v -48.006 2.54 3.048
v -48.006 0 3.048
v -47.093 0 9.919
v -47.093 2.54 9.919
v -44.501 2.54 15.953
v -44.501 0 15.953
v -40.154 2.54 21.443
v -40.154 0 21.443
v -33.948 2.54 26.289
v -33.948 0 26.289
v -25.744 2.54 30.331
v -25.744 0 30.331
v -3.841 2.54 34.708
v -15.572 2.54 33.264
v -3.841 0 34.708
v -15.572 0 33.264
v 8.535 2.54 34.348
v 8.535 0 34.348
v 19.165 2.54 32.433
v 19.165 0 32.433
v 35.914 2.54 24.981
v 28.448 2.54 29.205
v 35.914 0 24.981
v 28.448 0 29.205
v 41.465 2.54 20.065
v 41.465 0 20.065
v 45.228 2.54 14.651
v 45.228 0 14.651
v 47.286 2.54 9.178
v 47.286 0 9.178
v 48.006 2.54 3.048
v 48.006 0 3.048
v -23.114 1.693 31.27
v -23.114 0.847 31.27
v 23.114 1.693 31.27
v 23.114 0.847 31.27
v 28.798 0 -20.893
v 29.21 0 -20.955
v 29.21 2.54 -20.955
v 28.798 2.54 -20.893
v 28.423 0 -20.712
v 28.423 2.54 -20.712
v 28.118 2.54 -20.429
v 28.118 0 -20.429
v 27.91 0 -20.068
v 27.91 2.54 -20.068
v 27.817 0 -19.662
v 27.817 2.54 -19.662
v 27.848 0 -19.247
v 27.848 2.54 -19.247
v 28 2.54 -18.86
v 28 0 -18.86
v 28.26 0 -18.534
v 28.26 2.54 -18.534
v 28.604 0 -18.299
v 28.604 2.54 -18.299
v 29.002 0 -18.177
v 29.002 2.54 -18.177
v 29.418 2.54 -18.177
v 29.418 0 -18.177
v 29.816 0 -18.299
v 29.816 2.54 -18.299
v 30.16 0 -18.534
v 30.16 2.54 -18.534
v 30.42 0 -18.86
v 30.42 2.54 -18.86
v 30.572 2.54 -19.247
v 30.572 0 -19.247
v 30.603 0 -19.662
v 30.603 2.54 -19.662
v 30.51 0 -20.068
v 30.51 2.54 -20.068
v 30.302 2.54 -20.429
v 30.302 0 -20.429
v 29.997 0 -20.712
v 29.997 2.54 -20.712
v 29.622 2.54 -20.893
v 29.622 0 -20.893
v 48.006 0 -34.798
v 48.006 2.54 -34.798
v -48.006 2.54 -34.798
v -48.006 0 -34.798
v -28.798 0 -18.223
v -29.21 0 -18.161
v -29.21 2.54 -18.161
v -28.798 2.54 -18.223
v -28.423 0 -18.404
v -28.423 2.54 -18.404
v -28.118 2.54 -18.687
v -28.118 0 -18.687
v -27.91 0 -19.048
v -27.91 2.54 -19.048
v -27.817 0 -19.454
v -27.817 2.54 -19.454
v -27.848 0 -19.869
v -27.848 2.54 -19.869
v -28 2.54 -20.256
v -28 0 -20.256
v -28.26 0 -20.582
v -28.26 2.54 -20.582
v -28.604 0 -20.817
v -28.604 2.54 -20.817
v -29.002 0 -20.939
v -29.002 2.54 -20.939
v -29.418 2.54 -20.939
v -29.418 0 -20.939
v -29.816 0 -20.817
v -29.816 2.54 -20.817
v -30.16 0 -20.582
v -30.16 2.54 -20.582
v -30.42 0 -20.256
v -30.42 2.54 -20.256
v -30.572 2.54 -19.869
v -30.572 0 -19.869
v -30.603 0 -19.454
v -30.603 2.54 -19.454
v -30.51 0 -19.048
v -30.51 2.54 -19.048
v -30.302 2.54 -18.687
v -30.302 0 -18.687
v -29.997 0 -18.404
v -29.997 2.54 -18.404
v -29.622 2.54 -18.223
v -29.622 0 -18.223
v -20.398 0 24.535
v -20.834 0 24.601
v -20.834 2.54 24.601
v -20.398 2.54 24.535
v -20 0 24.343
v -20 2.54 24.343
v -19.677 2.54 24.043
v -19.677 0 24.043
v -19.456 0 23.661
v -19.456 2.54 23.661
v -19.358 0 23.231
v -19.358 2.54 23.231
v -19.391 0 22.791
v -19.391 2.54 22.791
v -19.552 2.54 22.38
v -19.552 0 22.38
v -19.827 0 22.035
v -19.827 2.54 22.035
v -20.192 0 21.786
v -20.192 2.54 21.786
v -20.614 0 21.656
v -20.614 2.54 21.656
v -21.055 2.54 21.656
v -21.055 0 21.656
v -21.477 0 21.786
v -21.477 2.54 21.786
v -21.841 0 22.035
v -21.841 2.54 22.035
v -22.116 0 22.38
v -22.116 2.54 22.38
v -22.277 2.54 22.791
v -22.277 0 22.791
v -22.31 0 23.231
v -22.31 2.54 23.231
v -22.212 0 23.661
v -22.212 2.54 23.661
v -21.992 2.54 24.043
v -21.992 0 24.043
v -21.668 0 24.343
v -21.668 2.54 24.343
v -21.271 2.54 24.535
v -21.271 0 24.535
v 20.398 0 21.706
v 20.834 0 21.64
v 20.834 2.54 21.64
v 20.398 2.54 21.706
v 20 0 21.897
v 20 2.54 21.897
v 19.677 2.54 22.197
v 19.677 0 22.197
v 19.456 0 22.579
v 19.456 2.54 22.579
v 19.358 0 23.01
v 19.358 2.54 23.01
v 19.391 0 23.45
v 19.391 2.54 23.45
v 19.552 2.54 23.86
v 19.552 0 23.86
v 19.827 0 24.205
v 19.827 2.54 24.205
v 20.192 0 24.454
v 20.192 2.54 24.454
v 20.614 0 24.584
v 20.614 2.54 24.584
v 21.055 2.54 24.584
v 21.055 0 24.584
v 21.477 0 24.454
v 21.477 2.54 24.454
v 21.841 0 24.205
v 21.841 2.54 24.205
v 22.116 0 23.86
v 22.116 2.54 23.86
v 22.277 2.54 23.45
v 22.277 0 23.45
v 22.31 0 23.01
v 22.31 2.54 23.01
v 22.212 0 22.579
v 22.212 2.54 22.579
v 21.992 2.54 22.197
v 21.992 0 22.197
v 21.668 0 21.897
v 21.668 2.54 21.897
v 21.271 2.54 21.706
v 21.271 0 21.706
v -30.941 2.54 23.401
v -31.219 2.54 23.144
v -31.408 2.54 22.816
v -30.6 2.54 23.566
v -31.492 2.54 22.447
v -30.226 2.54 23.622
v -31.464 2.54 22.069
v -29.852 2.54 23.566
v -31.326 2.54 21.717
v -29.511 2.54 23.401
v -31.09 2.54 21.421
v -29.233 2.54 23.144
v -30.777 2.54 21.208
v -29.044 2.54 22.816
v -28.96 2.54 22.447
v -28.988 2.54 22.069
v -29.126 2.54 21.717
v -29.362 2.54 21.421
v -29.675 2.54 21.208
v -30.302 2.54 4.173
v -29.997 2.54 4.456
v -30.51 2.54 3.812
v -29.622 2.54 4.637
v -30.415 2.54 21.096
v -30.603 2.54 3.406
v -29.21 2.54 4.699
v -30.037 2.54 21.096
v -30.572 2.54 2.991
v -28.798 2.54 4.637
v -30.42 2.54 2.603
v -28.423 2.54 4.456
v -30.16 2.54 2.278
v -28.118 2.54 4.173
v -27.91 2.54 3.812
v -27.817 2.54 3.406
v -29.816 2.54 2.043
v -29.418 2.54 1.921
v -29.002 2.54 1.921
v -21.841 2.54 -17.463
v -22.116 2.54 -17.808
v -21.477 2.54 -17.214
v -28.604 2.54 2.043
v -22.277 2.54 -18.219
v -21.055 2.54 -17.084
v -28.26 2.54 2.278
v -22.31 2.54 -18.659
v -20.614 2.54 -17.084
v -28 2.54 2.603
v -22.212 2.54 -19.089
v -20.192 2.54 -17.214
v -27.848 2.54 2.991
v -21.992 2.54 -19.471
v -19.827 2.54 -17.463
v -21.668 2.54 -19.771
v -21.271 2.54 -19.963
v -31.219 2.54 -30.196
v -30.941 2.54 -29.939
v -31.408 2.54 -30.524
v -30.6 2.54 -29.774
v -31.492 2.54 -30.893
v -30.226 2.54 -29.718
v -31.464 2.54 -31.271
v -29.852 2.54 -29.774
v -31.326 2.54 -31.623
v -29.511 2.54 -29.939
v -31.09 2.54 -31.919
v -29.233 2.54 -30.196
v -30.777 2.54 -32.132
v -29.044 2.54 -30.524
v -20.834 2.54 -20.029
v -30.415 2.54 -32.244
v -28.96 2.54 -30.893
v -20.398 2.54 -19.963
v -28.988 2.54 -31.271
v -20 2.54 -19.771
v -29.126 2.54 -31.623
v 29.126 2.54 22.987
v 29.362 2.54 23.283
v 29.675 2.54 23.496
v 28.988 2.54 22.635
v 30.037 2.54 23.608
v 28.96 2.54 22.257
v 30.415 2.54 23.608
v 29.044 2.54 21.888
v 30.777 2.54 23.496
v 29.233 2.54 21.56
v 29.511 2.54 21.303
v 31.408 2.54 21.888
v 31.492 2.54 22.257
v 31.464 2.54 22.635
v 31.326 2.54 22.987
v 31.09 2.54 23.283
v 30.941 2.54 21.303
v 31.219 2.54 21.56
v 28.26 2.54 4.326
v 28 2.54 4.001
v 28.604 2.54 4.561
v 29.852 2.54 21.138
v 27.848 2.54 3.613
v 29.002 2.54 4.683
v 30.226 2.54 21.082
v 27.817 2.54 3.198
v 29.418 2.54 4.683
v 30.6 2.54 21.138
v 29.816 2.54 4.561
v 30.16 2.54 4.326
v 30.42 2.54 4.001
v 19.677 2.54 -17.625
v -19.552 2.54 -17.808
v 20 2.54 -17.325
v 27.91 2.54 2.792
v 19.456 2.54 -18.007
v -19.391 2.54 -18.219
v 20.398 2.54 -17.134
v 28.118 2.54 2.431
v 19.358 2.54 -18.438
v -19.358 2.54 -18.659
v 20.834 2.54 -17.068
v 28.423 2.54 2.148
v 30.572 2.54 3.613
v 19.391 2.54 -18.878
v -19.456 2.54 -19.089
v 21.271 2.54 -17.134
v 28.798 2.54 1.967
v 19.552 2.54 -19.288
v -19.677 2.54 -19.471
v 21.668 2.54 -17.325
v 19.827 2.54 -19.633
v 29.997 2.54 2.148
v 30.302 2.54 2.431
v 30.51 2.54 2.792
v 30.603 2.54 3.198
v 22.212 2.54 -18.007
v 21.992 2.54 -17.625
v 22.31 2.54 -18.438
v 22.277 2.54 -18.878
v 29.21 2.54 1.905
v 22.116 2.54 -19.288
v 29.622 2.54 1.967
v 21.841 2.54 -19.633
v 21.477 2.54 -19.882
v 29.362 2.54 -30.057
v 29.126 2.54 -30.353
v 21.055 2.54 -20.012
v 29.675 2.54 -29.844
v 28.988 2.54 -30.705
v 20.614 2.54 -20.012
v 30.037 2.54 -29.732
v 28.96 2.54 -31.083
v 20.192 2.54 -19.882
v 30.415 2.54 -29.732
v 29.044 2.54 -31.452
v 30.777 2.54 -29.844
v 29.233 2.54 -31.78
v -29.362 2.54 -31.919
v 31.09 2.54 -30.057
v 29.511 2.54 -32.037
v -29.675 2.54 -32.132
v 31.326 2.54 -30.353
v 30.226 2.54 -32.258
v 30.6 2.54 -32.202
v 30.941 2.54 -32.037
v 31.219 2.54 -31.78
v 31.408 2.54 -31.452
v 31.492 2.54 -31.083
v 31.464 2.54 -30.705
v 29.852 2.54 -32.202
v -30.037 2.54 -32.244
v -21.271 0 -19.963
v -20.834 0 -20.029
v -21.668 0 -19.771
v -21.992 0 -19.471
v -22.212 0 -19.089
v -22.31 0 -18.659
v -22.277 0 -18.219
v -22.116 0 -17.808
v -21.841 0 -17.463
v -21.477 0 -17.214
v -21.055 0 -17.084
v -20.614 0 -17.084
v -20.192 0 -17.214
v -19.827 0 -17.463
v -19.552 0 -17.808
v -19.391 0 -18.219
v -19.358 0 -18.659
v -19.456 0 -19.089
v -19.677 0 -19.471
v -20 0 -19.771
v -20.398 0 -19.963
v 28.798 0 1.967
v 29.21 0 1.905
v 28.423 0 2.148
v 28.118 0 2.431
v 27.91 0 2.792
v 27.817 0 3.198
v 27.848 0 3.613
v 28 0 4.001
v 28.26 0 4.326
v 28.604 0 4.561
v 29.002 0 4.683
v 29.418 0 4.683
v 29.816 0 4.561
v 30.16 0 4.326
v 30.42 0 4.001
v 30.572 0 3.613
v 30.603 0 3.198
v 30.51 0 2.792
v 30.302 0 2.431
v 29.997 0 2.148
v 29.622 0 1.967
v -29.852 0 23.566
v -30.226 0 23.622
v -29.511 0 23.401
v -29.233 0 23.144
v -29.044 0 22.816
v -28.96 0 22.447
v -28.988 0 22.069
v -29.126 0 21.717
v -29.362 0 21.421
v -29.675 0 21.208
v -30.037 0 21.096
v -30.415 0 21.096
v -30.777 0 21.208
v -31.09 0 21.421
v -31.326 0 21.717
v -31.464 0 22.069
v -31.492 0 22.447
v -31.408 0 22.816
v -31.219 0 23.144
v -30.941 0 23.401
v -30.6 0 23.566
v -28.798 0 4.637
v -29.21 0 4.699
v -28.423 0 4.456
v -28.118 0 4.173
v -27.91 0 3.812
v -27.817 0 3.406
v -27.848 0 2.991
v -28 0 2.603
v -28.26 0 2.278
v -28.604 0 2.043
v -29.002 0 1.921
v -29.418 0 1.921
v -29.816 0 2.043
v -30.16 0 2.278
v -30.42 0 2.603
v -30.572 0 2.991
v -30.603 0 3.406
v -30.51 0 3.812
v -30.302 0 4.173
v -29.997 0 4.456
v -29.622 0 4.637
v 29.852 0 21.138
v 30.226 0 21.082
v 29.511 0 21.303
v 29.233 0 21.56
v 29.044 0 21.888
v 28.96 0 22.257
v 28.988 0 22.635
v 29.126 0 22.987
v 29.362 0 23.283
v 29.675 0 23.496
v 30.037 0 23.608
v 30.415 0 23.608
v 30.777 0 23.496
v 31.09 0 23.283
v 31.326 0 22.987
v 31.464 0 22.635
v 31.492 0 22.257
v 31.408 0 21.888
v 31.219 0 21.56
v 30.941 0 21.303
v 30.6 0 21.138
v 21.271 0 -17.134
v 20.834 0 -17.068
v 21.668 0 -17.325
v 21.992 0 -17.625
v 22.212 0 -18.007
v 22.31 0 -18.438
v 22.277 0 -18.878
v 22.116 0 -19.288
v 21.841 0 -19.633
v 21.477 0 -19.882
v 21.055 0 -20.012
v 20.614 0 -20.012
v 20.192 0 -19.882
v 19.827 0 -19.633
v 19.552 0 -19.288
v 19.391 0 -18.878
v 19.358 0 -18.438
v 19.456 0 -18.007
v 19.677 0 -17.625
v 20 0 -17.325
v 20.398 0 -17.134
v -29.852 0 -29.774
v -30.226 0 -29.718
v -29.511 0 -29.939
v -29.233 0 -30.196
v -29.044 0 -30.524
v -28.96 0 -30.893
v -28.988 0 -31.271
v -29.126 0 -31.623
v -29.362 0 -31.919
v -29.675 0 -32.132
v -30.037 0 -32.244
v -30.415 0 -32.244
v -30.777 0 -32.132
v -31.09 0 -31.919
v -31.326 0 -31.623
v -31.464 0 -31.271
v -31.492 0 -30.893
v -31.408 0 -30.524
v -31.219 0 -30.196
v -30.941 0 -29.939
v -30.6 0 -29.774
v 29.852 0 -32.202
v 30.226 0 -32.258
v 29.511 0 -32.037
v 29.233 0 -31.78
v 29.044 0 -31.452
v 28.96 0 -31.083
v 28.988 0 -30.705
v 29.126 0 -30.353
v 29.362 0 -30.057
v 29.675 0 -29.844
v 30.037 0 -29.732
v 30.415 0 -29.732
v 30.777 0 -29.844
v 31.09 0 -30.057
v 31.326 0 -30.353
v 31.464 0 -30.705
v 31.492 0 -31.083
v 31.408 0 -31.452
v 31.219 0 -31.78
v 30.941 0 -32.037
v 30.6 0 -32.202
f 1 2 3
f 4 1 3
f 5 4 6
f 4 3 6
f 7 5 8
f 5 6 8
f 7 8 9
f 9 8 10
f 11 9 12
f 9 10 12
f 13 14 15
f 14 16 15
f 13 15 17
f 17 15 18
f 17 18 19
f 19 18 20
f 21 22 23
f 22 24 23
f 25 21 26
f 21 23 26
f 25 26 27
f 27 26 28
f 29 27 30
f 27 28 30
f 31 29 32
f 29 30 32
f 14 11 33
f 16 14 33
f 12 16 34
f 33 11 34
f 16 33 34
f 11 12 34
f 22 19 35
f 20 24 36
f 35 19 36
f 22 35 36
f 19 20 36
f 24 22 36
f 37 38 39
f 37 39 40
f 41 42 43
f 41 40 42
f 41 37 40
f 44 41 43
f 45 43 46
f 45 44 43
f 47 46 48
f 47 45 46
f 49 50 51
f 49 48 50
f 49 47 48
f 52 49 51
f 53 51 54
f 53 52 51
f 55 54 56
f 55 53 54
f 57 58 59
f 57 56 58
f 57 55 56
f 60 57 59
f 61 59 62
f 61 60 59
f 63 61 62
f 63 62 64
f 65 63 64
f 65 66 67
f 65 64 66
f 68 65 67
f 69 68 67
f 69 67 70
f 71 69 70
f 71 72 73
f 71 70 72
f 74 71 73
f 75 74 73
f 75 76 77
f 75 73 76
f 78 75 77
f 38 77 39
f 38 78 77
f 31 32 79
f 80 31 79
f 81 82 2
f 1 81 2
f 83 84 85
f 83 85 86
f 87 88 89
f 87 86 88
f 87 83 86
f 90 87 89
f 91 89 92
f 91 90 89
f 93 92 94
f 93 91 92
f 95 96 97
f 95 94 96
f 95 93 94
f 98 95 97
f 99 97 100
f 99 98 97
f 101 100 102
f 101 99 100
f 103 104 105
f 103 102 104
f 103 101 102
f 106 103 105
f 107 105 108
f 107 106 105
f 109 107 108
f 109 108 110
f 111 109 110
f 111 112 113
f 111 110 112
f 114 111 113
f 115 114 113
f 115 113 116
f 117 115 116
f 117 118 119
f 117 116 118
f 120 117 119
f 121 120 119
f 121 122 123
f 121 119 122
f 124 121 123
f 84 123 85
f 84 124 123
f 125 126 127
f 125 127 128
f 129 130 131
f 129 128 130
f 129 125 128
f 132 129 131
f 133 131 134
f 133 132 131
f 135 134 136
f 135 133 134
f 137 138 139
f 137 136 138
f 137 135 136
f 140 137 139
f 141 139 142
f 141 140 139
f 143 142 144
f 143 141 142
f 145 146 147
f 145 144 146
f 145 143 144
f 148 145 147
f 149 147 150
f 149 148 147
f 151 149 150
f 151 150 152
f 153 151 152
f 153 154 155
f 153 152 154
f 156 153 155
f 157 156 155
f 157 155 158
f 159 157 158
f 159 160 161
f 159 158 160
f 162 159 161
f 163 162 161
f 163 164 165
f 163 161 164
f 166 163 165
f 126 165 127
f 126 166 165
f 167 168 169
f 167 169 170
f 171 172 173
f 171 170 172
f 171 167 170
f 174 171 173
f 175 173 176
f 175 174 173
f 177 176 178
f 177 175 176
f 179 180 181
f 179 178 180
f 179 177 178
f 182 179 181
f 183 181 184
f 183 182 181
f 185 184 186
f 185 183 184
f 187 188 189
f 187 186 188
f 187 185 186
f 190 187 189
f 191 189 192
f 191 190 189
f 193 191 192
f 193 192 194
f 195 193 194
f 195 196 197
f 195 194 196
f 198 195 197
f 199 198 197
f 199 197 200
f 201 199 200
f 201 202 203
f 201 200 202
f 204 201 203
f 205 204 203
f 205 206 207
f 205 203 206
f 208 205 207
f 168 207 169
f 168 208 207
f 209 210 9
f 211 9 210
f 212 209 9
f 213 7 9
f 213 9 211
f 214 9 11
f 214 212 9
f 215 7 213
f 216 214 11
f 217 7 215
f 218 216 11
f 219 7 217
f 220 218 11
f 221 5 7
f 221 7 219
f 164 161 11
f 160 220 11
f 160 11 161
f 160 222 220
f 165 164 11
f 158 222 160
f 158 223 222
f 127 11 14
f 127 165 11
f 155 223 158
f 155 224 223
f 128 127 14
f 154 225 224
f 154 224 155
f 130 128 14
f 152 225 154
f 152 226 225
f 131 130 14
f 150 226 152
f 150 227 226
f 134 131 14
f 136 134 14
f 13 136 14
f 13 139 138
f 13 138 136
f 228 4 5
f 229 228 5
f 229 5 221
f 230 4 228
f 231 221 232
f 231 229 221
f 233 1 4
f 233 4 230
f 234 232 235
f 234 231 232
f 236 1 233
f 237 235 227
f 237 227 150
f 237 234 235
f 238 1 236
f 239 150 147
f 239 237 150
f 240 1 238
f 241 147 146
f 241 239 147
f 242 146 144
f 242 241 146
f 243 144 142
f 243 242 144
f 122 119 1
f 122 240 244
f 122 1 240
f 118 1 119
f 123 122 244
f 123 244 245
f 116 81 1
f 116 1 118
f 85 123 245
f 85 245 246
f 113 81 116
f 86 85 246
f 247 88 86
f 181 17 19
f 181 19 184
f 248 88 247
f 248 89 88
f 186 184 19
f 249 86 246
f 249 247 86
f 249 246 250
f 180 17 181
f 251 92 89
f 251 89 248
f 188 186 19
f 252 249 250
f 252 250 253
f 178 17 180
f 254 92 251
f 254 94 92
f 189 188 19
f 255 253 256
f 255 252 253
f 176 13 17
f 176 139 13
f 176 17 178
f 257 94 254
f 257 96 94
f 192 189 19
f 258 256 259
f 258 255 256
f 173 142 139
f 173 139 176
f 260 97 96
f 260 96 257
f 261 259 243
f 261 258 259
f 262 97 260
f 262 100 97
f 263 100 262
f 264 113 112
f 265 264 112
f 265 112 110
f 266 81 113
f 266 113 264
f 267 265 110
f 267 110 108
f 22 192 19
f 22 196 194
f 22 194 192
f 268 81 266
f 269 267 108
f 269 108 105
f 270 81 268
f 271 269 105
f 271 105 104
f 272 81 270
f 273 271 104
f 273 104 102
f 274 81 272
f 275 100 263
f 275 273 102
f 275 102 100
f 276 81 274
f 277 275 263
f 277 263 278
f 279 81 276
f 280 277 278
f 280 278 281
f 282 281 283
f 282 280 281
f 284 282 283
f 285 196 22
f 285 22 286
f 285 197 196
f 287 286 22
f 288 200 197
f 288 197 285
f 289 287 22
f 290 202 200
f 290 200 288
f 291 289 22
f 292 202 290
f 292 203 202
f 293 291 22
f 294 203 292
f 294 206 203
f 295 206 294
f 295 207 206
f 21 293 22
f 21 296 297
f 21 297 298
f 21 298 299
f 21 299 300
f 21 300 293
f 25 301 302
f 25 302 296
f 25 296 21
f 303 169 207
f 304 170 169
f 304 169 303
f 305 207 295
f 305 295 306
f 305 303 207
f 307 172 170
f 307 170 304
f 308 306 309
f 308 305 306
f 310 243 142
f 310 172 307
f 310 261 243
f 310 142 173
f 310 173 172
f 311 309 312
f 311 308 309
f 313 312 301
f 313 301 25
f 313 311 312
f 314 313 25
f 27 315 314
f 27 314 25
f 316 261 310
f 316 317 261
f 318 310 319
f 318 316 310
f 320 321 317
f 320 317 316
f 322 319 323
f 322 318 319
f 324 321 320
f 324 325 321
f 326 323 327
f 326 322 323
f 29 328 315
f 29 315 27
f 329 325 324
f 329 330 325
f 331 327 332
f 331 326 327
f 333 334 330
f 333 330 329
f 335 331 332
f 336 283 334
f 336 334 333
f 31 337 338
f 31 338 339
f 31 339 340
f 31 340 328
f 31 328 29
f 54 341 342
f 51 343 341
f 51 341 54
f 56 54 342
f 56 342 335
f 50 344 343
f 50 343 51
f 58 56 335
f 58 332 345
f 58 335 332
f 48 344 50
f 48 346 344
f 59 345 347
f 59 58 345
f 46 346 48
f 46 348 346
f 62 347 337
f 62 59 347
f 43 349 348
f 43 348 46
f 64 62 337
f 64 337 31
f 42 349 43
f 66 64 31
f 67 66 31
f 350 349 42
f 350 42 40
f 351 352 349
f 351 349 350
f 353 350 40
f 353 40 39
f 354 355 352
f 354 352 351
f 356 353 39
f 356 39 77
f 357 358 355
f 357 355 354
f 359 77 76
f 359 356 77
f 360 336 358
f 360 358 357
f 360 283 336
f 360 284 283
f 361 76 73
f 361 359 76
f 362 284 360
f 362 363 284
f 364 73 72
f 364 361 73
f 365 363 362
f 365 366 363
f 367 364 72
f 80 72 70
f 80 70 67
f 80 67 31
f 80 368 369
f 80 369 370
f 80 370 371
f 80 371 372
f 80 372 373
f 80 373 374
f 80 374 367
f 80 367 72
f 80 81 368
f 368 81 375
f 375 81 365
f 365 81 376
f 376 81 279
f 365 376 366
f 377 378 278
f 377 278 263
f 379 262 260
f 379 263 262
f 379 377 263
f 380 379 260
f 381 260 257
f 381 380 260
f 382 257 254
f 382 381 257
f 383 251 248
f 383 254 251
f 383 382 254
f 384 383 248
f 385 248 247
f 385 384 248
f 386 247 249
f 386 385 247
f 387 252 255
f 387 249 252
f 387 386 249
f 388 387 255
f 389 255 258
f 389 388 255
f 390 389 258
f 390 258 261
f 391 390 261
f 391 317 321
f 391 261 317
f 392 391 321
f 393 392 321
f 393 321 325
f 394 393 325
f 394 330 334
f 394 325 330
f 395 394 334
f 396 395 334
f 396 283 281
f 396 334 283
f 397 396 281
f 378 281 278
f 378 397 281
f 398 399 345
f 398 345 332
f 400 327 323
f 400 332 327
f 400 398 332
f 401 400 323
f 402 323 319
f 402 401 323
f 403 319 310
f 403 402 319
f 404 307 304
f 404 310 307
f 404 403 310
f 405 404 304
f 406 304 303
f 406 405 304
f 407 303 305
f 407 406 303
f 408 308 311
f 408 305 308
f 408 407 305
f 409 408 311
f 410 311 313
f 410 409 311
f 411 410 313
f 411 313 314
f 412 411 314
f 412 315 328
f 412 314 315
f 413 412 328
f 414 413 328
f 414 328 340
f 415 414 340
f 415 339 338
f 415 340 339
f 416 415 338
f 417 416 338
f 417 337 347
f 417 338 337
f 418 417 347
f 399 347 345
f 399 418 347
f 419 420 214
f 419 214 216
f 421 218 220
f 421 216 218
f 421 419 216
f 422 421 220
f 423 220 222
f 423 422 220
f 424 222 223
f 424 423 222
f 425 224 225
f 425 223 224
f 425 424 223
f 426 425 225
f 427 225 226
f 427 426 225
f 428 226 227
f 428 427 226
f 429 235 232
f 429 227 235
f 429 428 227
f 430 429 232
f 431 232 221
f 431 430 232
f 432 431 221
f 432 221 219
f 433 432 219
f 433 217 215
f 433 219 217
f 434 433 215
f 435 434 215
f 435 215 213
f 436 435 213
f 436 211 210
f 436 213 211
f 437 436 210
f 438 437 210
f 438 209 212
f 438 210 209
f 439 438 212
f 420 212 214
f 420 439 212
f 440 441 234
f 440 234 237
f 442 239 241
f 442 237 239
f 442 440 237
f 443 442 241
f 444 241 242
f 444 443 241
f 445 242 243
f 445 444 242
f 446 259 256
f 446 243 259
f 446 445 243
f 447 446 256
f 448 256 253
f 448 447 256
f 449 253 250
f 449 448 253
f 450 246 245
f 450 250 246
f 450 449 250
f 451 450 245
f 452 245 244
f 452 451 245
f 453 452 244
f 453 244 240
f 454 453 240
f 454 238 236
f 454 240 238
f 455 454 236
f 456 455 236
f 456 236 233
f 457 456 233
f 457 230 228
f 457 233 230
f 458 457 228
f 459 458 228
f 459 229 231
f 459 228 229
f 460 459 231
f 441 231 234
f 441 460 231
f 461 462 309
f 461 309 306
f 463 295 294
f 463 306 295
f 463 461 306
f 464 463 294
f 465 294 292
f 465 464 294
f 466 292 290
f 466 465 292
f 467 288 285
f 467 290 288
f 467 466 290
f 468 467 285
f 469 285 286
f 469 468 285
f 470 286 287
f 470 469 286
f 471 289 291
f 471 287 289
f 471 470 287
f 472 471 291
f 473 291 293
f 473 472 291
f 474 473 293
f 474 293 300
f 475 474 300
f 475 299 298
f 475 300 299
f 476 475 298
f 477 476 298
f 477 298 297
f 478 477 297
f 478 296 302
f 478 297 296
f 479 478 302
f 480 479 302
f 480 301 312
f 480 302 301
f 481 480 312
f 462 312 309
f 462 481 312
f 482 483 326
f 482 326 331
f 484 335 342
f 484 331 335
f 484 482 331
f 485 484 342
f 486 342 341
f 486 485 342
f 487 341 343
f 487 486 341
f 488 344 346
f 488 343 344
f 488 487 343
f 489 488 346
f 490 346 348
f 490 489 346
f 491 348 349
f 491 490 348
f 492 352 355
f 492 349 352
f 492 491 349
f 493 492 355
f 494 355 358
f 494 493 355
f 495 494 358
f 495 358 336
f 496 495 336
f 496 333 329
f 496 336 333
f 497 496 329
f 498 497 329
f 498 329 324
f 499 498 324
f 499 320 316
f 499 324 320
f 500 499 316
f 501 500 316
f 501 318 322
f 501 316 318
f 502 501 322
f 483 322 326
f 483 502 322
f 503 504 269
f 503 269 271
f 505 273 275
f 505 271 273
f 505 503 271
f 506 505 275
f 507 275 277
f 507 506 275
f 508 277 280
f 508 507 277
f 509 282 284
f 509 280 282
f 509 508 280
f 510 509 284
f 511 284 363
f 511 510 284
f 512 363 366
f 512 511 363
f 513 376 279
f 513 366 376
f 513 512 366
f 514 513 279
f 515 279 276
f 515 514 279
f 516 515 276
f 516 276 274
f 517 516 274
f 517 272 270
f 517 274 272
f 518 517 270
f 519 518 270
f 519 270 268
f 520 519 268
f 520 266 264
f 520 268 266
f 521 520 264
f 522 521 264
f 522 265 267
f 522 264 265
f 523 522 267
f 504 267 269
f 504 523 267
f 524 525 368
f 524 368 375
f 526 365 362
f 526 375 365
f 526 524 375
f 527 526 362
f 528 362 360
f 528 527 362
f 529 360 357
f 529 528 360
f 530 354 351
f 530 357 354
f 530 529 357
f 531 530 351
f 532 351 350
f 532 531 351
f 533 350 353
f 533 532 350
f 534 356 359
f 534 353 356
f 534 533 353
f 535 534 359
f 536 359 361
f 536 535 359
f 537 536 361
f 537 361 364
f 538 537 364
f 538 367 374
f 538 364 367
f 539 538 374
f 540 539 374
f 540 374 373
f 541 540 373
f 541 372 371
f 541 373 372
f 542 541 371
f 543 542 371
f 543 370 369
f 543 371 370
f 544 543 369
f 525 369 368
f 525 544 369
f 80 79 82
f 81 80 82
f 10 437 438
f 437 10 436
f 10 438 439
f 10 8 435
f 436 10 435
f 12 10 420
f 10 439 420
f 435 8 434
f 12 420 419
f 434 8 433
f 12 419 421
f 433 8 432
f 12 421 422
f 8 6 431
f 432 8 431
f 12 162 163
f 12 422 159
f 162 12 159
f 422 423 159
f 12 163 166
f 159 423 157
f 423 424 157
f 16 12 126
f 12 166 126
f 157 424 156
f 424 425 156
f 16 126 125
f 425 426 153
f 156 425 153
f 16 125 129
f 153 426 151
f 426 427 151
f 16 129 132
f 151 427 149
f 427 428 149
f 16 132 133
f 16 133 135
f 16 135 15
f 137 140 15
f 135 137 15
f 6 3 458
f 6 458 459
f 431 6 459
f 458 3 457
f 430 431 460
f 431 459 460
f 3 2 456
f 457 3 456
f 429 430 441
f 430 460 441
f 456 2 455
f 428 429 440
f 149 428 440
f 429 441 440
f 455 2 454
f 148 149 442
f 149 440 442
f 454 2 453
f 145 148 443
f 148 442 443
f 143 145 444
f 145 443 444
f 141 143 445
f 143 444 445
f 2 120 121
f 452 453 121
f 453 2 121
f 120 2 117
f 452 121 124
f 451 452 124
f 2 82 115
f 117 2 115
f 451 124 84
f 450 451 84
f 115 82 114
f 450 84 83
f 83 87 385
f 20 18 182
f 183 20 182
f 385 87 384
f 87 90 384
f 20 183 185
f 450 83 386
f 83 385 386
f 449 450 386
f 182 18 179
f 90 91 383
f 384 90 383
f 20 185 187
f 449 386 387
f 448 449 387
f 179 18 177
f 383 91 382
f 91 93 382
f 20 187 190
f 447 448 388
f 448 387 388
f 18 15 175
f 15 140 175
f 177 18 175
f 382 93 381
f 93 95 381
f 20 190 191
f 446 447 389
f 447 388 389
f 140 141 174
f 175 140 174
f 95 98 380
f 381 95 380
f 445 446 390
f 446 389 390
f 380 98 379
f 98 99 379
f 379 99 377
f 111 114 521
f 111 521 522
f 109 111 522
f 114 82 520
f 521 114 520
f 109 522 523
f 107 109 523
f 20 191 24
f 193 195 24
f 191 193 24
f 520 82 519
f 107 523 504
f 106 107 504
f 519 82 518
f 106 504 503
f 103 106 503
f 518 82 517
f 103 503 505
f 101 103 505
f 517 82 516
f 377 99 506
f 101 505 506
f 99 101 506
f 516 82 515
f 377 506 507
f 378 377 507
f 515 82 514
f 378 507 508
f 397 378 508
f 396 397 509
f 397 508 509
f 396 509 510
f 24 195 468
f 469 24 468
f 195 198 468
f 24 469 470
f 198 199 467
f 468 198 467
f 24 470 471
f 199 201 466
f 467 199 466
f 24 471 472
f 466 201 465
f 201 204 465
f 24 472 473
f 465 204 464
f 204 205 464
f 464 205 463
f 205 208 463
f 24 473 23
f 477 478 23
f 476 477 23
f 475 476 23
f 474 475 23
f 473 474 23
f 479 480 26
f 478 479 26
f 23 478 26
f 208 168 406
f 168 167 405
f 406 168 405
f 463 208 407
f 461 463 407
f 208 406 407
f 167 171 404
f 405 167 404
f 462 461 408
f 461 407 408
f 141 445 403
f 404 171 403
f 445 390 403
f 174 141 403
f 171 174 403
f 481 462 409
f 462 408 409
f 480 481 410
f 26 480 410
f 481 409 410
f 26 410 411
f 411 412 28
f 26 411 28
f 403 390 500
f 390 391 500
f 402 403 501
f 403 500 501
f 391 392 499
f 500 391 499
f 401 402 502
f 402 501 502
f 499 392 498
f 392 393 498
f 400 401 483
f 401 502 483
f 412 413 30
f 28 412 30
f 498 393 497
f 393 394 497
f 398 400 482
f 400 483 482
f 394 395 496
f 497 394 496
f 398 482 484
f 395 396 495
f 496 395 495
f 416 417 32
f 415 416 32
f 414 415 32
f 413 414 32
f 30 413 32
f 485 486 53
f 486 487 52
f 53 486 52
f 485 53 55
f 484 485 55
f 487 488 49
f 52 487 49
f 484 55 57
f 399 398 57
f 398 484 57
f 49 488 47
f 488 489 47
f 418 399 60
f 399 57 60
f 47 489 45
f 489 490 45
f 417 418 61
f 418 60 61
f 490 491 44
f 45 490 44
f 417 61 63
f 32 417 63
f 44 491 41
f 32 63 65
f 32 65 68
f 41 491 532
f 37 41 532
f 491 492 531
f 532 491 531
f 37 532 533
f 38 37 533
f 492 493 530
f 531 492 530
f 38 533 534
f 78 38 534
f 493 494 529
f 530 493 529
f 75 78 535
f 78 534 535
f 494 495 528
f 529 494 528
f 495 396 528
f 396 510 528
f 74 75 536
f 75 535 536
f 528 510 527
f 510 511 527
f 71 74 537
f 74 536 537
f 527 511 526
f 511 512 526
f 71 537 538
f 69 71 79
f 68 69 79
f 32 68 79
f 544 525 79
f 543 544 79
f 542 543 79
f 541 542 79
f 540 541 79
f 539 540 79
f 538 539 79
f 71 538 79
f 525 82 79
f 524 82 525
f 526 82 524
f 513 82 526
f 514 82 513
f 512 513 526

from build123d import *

# Parameters (mm, degrees)
BOSS_EXTRUDE1_DEPTH     = 2.54
CUT_EXTRUDE1_DEPTH      = 60.34583774
CUT_EXTRUDE1_DEPTH_BACK = 60.34583774
SKETCH3_R               = 1.27
SKETCH3_R_2             = 1.397
SKETCH3_R_3             = 1.480396735


with BuildPart() as part:
    # Sketch2 → Boss-Extrude1 (new body)
    with BuildSketch(Plane(origin=(0, 0, 0), x_dir=(1, 0, 0), z_dir=(0, 1, 0))):
        with BuildLine():
            Line((48.006, 34.798), (-48.006, 34.798))
            Line((-48.006, 34.798), (-48.006, -3.048))
            add(Edge.make_bspline(
                [(-48.006, -3.048), (-48.006, -45.381333333), (48.006, -45.381333333), (48.006, -3.048)],
                knots=[0, 0, 0, 0, 1, 1, 1, 1], degree=3))
            Line((48.006, -3.048), (48.006, 34.798))
        make_face()
    extrude(amount=BOSS_EXTRUDE1_DEPTH)

    # Sketch3 → Cut-Extrude1 (cut, two sides: drawn at the far end of the back side and taken through both)
    with BuildSketch(Plane(origin=(0, 2.54, 0), x_dir=(1, 0, 0), z_dir=(0, 1, 0)).offset(-CUT_EXTRUDE1_DEPTH_BACK)):
        with Locations(Location((-30.226, 30.988, 0), (0, 0, 270))):
            Circle(SKETCH3_R)
        with Locations(Location((-30.226, -22.352, 0), (0, 0, 270))):
            Circle(SKETCH3_R)
        with Locations(Location((30.226, -22.352, 0), (0, 0, 90))):
            Circle(SKETCH3_R)
        with Locations(Location((30.226, 30.988, 0), (0, 0, 90))):
            Circle(SKETCH3_R)
        with Locations(Location((-29.21, 19.558, 0), (0, 0, 270))):
            Circle(SKETCH3_R_2)
        with Locations(Location((-29.21, -3.302, 0), (0, 0, 270))):
            Circle(SKETCH3_R_2)
        with Locations(Location((29.21, -3.302, 0), (0, 0, 90))):
            Circle(SKETCH3_R_2)
        with Locations(Location((29.21, 19.558, 0), (0, 0, 90))):
            Circle(SKETCH3_R_2)
        with Locations(Location((20.834194201, 18.548194201, 0), (0, 0, 270))):
            Circle(SKETCH3_R_3)
        with Locations(Location((20.834194201, -23.120194201, 0), (0, 0, 90))):
            Circle(SKETCH3_R_3)
        with Locations(Location((-20.834194201, 18.548194201, 0), (0, 0, 90))):
            Circle(SKETCH3_R_3)
        with Locations(Location((-20.834194201, -23.120194201, 0), (0, 0, 270))):
            Circle(SKETCH3_R_3)
    extrude(amount=CUT_EXTRUDE1_DEPTH + CUT_EXTRUDE1_DEPTH_BACK, mode=Mode.SUBTRACT)


solid = part.part
